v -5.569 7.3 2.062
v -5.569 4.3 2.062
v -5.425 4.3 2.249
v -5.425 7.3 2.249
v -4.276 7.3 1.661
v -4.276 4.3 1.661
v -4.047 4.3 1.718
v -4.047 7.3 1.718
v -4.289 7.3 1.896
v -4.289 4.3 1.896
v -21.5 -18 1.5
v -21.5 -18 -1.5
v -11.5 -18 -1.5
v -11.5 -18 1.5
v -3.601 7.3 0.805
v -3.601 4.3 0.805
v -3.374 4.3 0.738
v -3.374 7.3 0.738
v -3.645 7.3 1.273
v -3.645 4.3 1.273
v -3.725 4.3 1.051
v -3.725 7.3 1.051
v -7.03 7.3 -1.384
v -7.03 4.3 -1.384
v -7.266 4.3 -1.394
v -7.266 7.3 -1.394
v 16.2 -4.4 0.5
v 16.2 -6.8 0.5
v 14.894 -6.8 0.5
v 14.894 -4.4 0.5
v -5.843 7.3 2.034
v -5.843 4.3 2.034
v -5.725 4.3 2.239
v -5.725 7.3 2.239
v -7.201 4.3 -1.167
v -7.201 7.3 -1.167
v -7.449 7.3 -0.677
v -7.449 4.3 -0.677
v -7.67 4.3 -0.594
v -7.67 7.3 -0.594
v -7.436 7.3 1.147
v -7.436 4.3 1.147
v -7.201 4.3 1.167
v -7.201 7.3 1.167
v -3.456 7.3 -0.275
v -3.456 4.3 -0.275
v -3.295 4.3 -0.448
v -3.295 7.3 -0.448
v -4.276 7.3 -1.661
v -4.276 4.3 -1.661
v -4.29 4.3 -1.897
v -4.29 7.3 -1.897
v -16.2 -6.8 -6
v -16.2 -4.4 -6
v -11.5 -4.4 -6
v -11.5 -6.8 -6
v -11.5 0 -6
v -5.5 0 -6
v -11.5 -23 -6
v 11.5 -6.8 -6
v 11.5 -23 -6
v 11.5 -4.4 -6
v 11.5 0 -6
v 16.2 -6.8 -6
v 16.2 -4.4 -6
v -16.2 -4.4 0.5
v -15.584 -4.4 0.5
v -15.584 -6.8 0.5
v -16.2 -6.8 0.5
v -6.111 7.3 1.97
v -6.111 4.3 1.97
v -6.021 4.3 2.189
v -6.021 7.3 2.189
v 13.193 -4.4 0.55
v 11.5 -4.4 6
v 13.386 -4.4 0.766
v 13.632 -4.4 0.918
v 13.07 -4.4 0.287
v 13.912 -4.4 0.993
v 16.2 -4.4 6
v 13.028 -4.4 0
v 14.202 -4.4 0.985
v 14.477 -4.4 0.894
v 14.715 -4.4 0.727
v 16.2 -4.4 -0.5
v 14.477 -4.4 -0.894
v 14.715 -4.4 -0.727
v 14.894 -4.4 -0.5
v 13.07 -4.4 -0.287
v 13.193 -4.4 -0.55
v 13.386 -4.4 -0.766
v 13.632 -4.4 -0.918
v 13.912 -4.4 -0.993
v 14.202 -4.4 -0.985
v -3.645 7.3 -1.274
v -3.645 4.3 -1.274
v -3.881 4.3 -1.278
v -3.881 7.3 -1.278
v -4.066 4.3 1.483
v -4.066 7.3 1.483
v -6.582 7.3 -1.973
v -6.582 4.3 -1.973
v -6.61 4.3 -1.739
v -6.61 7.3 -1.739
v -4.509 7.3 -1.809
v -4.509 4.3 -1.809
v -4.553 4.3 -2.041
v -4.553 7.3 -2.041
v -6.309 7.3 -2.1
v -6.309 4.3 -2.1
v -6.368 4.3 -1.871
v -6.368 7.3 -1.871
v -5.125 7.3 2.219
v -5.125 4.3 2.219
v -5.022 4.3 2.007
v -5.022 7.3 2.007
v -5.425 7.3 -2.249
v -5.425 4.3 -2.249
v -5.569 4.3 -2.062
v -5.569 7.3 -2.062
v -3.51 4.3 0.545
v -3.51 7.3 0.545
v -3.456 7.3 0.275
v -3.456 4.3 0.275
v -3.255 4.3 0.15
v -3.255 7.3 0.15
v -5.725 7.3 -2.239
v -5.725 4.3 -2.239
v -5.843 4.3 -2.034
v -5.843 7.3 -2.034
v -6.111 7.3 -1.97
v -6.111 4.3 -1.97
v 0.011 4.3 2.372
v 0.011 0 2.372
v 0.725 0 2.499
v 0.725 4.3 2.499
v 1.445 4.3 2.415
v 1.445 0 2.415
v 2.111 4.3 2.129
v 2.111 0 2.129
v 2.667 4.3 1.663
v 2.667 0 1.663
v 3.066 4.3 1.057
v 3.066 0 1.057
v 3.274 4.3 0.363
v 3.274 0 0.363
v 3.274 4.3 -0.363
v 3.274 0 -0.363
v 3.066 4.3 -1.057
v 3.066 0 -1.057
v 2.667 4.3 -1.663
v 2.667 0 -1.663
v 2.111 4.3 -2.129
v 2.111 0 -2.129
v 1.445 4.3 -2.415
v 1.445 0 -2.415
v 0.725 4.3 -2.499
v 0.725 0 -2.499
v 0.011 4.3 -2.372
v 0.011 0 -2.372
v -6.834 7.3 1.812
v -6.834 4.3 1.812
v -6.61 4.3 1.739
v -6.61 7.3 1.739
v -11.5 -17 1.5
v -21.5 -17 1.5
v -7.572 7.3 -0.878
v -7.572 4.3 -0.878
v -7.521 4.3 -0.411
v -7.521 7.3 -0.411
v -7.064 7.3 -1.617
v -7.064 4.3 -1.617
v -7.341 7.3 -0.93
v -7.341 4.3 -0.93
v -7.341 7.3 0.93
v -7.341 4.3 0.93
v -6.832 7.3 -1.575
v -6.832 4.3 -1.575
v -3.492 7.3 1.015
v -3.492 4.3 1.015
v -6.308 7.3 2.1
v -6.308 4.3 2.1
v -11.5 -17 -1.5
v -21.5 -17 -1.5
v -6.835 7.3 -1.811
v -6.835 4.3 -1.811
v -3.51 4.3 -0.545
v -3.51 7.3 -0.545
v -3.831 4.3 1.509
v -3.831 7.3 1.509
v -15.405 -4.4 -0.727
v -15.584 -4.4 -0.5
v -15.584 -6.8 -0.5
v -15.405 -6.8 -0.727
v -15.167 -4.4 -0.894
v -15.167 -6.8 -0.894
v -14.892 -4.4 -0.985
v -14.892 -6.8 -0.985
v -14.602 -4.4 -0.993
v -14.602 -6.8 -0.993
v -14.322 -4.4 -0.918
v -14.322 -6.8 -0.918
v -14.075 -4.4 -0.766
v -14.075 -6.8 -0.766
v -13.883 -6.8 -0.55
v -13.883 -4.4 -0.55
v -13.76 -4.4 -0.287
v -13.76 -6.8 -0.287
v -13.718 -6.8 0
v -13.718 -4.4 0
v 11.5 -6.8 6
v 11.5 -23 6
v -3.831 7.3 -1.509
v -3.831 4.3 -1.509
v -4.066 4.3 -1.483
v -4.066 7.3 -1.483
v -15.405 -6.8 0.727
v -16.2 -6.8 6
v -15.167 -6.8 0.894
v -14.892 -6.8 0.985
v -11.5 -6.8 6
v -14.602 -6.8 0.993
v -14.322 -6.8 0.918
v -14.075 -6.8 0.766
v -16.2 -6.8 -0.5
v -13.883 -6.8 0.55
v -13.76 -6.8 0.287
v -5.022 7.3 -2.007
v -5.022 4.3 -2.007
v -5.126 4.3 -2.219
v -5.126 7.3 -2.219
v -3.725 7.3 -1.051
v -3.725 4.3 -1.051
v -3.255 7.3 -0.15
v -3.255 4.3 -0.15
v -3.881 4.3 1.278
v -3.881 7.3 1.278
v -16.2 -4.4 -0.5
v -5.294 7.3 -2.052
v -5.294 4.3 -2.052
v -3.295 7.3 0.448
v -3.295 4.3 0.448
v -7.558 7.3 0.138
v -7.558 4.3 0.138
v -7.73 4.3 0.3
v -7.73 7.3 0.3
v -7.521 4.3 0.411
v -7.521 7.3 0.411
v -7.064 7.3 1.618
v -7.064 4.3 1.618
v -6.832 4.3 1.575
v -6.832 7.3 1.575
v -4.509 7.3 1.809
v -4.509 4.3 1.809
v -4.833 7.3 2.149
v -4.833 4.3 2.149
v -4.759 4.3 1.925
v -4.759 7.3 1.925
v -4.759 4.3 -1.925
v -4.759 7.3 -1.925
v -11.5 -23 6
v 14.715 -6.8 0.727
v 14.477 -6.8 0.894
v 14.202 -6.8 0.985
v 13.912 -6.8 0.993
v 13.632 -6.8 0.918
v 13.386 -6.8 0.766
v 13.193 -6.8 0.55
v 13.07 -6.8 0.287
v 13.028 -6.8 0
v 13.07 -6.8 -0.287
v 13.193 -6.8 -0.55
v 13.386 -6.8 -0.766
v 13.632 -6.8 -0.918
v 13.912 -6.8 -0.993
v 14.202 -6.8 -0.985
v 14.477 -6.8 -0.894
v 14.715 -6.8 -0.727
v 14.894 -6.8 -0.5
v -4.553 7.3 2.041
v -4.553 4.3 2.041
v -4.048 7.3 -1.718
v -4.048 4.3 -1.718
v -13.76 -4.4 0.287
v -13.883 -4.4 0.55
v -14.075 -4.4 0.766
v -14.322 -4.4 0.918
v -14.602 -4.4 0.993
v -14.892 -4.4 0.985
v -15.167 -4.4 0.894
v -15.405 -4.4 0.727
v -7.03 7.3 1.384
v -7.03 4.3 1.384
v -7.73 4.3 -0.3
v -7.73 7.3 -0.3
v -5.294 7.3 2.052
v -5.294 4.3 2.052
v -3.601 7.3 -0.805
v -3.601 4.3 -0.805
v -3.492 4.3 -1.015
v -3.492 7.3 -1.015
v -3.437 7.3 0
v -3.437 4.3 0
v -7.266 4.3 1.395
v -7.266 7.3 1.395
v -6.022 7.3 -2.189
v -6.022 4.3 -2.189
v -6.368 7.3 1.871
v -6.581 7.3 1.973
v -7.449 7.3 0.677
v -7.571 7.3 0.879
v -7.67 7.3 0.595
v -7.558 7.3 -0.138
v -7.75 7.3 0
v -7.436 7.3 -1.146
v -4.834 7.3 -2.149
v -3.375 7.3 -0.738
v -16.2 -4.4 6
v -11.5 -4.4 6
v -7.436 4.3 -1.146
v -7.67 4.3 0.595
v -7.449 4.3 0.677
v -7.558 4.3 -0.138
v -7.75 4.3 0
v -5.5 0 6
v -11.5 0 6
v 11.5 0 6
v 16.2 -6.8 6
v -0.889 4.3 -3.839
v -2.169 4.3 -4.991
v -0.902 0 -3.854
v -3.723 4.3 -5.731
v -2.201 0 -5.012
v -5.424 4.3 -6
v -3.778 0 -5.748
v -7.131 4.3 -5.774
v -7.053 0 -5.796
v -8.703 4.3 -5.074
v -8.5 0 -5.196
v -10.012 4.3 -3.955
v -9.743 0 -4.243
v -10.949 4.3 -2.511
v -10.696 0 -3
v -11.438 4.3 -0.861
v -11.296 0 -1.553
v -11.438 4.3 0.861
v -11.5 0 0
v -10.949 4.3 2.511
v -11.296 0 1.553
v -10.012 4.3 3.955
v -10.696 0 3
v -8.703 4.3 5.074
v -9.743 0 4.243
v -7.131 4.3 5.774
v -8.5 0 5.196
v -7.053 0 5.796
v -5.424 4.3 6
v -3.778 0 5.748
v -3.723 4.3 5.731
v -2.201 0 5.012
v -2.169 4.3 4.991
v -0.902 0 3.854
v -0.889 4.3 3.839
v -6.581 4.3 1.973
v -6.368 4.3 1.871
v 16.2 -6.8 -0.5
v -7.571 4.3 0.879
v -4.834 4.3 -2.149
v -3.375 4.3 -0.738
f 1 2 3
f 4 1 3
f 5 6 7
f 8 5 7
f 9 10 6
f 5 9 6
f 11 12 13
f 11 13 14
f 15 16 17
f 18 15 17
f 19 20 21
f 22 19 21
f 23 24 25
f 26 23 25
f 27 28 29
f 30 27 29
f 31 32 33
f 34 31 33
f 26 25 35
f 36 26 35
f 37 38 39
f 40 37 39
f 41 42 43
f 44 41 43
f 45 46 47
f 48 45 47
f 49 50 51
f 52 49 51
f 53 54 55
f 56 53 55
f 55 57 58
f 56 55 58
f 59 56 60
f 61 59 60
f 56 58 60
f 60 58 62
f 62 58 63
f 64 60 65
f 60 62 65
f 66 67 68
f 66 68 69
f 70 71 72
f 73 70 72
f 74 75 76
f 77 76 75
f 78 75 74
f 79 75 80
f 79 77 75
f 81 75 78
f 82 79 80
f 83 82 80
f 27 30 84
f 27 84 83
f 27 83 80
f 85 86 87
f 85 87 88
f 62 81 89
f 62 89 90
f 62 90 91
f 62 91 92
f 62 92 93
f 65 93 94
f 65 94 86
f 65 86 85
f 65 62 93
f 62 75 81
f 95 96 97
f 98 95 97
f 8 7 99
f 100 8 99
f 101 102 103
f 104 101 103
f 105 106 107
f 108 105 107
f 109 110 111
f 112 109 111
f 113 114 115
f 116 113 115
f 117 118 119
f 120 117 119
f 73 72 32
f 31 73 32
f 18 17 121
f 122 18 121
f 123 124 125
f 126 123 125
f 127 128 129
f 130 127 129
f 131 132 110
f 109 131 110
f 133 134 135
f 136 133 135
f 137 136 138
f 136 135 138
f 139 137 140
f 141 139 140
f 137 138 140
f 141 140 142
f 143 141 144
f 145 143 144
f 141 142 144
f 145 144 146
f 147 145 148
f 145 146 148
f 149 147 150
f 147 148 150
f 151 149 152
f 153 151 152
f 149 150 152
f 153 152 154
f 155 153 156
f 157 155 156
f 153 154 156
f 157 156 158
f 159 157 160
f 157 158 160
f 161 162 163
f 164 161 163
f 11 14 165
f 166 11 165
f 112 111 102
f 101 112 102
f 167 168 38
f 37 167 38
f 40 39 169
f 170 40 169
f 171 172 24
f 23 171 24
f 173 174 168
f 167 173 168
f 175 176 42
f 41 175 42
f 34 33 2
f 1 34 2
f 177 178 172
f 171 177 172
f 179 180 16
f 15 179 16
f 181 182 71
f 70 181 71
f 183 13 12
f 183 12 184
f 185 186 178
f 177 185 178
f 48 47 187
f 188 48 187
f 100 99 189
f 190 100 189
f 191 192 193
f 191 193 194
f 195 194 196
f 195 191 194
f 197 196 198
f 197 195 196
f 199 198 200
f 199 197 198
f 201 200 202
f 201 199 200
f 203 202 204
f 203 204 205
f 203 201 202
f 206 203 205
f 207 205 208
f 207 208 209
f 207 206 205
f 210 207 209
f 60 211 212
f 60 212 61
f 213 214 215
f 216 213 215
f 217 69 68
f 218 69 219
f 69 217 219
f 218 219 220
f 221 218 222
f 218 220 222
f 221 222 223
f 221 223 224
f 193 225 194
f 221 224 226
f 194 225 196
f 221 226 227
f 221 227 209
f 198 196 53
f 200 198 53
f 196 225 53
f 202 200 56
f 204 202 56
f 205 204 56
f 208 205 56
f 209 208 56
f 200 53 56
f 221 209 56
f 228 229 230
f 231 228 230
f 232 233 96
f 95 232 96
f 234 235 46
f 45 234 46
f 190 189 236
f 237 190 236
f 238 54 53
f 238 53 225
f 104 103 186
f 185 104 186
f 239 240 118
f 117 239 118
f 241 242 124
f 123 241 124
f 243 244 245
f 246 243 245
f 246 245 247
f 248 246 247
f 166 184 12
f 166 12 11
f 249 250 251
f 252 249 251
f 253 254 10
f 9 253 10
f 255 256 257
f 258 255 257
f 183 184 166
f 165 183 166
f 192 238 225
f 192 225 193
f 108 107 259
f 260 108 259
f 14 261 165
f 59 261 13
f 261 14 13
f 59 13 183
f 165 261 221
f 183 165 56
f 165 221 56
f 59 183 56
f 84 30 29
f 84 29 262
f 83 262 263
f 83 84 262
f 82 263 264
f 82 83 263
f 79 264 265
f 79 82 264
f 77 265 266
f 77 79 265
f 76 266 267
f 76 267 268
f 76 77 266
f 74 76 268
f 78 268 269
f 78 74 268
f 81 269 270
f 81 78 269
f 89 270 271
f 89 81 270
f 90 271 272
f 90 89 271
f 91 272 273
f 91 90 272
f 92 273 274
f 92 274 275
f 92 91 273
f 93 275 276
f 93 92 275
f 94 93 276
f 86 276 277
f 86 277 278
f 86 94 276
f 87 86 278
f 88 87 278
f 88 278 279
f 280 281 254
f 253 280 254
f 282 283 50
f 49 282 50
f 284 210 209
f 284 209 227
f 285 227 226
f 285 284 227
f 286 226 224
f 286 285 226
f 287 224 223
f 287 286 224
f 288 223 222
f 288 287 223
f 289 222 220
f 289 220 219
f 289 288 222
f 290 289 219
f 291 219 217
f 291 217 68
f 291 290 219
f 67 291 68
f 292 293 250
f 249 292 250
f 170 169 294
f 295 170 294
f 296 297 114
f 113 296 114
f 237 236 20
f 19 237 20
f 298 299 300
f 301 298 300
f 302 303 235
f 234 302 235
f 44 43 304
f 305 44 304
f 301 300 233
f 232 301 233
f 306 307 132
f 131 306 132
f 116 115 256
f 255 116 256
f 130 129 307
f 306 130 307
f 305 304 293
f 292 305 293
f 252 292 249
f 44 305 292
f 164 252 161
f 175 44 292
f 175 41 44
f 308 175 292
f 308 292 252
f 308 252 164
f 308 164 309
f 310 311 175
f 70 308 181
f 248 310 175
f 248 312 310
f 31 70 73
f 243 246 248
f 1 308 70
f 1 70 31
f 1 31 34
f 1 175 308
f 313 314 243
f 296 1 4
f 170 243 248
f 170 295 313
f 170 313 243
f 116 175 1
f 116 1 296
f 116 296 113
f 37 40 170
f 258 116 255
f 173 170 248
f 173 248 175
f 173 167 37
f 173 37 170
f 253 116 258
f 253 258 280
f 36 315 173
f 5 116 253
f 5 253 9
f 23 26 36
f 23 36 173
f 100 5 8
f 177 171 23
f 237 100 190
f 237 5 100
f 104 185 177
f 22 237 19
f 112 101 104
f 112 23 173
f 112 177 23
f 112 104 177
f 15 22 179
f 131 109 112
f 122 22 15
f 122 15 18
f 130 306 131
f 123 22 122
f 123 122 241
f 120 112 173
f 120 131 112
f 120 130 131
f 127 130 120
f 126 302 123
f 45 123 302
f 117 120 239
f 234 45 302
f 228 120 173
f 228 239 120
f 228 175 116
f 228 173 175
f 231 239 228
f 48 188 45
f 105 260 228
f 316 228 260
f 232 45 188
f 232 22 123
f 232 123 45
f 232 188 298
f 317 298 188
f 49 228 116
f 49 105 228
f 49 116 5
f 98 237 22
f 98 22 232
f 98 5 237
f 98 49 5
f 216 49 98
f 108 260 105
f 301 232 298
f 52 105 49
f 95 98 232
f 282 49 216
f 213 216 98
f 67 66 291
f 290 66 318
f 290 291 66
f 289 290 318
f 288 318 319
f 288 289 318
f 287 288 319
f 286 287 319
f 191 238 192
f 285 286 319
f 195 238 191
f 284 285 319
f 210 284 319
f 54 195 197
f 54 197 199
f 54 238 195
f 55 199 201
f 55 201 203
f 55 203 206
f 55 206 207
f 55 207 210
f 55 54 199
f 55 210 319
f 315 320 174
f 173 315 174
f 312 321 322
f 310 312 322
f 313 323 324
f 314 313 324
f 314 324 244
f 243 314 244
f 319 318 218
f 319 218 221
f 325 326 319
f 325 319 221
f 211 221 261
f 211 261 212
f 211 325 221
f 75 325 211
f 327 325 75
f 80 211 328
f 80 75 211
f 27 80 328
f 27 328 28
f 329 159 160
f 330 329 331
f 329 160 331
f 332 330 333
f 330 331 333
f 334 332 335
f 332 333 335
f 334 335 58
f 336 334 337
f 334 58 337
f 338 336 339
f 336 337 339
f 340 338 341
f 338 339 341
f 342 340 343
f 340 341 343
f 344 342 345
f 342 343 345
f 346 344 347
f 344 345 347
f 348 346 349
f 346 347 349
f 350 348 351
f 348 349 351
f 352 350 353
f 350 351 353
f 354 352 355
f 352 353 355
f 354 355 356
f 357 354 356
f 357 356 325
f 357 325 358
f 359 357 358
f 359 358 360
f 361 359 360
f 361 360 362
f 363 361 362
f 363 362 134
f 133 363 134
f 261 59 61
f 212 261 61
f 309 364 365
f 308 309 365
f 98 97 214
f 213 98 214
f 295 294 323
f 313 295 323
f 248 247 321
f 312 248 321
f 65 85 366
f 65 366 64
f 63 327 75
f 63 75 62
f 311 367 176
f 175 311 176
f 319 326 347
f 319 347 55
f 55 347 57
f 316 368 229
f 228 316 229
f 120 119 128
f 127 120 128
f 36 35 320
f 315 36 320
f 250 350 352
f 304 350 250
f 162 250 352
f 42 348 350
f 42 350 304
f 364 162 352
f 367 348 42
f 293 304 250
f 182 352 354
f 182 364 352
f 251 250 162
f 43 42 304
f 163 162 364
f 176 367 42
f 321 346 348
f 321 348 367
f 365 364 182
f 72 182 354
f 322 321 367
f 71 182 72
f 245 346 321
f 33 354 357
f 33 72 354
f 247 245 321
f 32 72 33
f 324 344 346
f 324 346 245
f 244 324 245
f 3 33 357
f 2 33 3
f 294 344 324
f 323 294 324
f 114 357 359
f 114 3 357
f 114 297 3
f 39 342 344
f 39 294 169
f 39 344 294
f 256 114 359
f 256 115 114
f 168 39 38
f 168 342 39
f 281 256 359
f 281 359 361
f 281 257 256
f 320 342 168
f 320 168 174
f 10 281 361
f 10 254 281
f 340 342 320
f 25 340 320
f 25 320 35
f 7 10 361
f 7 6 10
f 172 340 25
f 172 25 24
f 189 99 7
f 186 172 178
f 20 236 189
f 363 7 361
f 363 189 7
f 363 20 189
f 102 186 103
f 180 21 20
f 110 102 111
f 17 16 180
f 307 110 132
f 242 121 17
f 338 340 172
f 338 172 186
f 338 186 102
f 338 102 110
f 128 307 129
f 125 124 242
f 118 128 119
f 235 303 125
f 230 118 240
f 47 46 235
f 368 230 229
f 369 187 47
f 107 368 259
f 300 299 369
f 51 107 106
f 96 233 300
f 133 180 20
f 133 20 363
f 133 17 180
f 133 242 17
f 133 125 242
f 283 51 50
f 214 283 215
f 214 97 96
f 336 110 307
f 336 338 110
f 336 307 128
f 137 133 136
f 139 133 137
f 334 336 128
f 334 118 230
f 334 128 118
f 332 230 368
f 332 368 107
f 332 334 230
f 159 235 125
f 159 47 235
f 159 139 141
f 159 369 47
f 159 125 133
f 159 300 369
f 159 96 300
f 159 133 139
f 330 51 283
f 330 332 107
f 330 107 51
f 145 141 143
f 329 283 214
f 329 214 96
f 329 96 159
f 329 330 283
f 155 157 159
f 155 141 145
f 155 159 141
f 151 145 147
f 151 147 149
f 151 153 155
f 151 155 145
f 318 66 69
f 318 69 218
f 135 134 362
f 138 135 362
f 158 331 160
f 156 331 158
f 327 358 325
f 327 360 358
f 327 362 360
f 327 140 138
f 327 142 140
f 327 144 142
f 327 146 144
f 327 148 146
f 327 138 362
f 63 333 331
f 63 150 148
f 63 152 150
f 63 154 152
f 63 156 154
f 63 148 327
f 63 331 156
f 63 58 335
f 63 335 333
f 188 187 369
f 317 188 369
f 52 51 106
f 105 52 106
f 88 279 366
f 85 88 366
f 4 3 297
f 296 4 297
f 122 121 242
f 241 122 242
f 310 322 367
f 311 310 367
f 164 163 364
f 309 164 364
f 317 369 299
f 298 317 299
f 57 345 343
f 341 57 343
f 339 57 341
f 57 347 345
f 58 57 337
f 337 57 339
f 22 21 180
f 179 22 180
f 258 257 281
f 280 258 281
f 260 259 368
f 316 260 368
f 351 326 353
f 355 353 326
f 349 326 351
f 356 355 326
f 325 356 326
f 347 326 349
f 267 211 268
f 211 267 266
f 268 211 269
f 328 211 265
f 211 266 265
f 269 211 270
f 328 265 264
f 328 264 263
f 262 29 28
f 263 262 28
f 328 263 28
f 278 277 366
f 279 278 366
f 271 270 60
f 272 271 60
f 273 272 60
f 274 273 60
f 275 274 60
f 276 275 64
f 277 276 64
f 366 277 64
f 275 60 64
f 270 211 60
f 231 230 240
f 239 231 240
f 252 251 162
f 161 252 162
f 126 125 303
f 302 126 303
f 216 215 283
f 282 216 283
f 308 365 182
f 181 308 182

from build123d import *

# Parameters (mm, degrees)
SKETCH2_W           = 23
SKETCH2_H           = 12
BOSS_EXTRUDE1_DEPTH = 23
BOSS_EXTRUDE2_START = -4.4
BOSS_EXTRUDE2_DEPTH = 2.4
SKETCH4_R           = 6
SKETCH4_R_2         = 2.5
BOSS_EXTRUDE3_DEPTH = 4.3
BOSS_EXTRUDE4_DEPTH = 3
SKETCH6_W           = 3
SKETCH6_H           = 1
BOSS_EXTRUDE5_DEPTH = 10


with BuildPart() as part:
    # Sketch2 → Boss-Extrude1 (new body)
    with BuildSketch(Plane(origin=(0, 0, 0), x_dir=(1, 0, 0), z_dir=(0, 1, 0))):
        Rectangle(SKETCH2_W, SKETCH2_H)
    extrude(amount=-BOSS_EXTRUDE1_DEPTH)

    # Sketch3 → Boss-Extrude2 (add)
    with BuildSketch(Plane(origin=(0, 0, 0), x_dir=(1, 0, 0), z_dir=(0, 1, 0)).offset(BOSS_EXTRUDE2_START)):
        with BuildLine():
            Line((-16.2, -0.5), (-16.2, -6))
            Line((-16.2, -6), (-11.5, -6))
            Line((-11.5, -6), (-11.5, 6))
            Line((-11.5, 6), (-16.2, 6))
            Line((-16.2, 6), (-16.2, 0.5))
            Line((-16.2, 0.5), (-15.584293743, 0.5))
            ThreePointArc((-15.584293743, 0.5), (-14.459449294, 0.965925826), (-13.718268339, 0))
            ThreePointArc((-13.718268339, 0), (-14.459449294, -0.965925826), (-15.584293743, -0.5))
            Line((-15.584293743, -0.5), (-16.2, -0.5))
        make_face()
        with BuildLine():
            Line((11.5, 6), (11.5, -6))
            Line((11.5, -6), (16.2, -6))
            Line((16.2, -6), (16.2, -0.5))
            Line((16.2, -0.5), (14.894380034, -0.5))
            ThreePointArc((14.894380034, -0.5), (13.02835463, 0), (14.894380034, 0.5))
            Line((14.894380034, 0.5), (16.2, 0.5))
            Line((16.2, 0.5), (16.2, 6))
            Line((16.2, 6), (11.5, 6))
        make_face()
    extrude(amount=-BOSS_EXTRUDE2_DEPTH)

    # Sketch4 → Boss-Extrude3 (add)
    with BuildSketch(Plane(origin=(0, 0, 0), x_dir=(1, 0, 0), z_dir=(0, 1, 0))):
        with Locations((-5.5, 0)):
            Circle(SKETCH4_R)
        with Locations((0.8, 0)):
            Circle(SKETCH4_R_2)
    extrude(amount=BOSS_EXTRUDE3_DEPTH)

    # Sketch5 → Boss-Extrude4 (add)
    with BuildSketch(Plane(origin=(0, 4.3, 0), x_dir=(1, 0, 0), z_dir=(0, 1, 0))):
        Polygon((-3.255005568, -0.15), (-3.437184296, 0), (-3.255005568, 0.15), (-3.455589794, 0.274946425), (-3.295142762, 0.44844683), (-3.51047784, 0.544986424), (-3.374587739, 0.738324266), (-3.600868956, 0.805301127), (-3.491960749, 1.015026288), (-3.725150111, 1.051245213), (-3.645167266, 1.273615142), (-3.881103504, 1.278429803), (-3.831473318, 1.509476304), (-4.065946143, 1.482800783), (-4.047554268, 1.718400825), (-4.276379508, 1.660711148), (-4.289554146, 1.896660443), (-4.508648409, 1.808986083), (-4.553154459, 2.04107411), (-4.758608002, 1.924979619), (-4.833651254, 2.149064761), (-5.021797754, 2.006621847), (-5.126039057, 2.218705301), (-5.293521035, 2.052455862), (-5.425100203, 2.248752992), (-5.568928939, 2.061663752), (-5.725497937, 2.238671633), (-5.843106805, 2.034081205), (-6.021871655, 2.188641125), (-6.111161921, 1.97020043), (-6.308932561, 2.099554265), (-6.368310838, 1.871161381), (-6.581558046, 1.973000809), (-6.609964728, 1.738731414), (-6.834883102, 1.811239107), (-6.831811271, 1.575273743), (-7.064387138, 1.6171558), (-7.02989161, 1.383705275), (-7.265974648, 1.39421431), (-7.200670997, 1.167444554), (-7.436048299, 1.146393032), (-7.34110187, 0.930350756), (-7.571573122, 0.878114343), (-7.448678237, 0.676654828), (-7.670130674, 0.594165683), (-7.521480394, 0.410883978), (-7.729962192, 0.299614123), (-7.558209186, 0.137780894), (-7.749999982, -0.000284059), (-7.558209186, -0.137780894), (-7.729886469, -0.300177172), (-7.521480394, -0.410883978), (-7.669980579, -0.594713616), (-7.448678237, -0.676654828), (-7.571351335, -0.878637381), (-7.34110187, -0.930350756), (-7.435758777, -1.146881842), (-7.200670997, -1.167444554), (-7.265622557, -1.394660168), (-7.02989161, -1.383705275), (-7.063978761, -1.617550752), (-6.831811271, -1.575273743), (-6.834425728, -1.811576103), (-6.609964728, -1.738731414), (-6.581059835, -1.973273836), (-6.368310838, -1.871161381), (-6.308402404, -2.099758451), (-6.111161921, -1.97020043), (-6.021319013, -2.188772827), (-5.843106805, -2.034081205), (-5.724932672, -2.238728499), (-5.568928939, -2.061663752), (-5.424532402, -2.248734009), (-5.293521035, -2.052455862), (-5.125478853, -2.218610806), (-5.021797754, -2.006621847), (-4.833108643, -2.148896442), (-4.758608002, -1.924979619), (-4.552639125, -2.040834969), (-4.508648409, -1.808986083), (-4.289075284, -1.896354748), (-4.276379508, -1.660711148), (-4.047120423, -1.718034032), (-4.065946143, -1.482800783), (-3.831092233, -1.509054958), (-3.881103504, -1.278429803), (-3.644845742, -1.273146762), (-3.725150111, -1.051245213), (-3.491704522, -1.014519232), (-3.600868956, -0.805301127), (-3.374401382, -0.737787582), (-3.51047784, -0.544986424), (-3.295029601, -0.447890096), (-3.455589794, -0.274946425), align=None)
    extrude(amount=BOSS_EXTRUDE4_DEPTH)

    # Sketch6 → Boss-Extrude5 (add)
    with BuildSketch(Plane.ZY.offset(11.5)):
        with Locations((0, -17.5)):
            Rectangle(SKETCH6_W, SKETCH6_H)
    extrude(amount=BOSS_EXTRUDE5_DEPTH)


solid = part.part
